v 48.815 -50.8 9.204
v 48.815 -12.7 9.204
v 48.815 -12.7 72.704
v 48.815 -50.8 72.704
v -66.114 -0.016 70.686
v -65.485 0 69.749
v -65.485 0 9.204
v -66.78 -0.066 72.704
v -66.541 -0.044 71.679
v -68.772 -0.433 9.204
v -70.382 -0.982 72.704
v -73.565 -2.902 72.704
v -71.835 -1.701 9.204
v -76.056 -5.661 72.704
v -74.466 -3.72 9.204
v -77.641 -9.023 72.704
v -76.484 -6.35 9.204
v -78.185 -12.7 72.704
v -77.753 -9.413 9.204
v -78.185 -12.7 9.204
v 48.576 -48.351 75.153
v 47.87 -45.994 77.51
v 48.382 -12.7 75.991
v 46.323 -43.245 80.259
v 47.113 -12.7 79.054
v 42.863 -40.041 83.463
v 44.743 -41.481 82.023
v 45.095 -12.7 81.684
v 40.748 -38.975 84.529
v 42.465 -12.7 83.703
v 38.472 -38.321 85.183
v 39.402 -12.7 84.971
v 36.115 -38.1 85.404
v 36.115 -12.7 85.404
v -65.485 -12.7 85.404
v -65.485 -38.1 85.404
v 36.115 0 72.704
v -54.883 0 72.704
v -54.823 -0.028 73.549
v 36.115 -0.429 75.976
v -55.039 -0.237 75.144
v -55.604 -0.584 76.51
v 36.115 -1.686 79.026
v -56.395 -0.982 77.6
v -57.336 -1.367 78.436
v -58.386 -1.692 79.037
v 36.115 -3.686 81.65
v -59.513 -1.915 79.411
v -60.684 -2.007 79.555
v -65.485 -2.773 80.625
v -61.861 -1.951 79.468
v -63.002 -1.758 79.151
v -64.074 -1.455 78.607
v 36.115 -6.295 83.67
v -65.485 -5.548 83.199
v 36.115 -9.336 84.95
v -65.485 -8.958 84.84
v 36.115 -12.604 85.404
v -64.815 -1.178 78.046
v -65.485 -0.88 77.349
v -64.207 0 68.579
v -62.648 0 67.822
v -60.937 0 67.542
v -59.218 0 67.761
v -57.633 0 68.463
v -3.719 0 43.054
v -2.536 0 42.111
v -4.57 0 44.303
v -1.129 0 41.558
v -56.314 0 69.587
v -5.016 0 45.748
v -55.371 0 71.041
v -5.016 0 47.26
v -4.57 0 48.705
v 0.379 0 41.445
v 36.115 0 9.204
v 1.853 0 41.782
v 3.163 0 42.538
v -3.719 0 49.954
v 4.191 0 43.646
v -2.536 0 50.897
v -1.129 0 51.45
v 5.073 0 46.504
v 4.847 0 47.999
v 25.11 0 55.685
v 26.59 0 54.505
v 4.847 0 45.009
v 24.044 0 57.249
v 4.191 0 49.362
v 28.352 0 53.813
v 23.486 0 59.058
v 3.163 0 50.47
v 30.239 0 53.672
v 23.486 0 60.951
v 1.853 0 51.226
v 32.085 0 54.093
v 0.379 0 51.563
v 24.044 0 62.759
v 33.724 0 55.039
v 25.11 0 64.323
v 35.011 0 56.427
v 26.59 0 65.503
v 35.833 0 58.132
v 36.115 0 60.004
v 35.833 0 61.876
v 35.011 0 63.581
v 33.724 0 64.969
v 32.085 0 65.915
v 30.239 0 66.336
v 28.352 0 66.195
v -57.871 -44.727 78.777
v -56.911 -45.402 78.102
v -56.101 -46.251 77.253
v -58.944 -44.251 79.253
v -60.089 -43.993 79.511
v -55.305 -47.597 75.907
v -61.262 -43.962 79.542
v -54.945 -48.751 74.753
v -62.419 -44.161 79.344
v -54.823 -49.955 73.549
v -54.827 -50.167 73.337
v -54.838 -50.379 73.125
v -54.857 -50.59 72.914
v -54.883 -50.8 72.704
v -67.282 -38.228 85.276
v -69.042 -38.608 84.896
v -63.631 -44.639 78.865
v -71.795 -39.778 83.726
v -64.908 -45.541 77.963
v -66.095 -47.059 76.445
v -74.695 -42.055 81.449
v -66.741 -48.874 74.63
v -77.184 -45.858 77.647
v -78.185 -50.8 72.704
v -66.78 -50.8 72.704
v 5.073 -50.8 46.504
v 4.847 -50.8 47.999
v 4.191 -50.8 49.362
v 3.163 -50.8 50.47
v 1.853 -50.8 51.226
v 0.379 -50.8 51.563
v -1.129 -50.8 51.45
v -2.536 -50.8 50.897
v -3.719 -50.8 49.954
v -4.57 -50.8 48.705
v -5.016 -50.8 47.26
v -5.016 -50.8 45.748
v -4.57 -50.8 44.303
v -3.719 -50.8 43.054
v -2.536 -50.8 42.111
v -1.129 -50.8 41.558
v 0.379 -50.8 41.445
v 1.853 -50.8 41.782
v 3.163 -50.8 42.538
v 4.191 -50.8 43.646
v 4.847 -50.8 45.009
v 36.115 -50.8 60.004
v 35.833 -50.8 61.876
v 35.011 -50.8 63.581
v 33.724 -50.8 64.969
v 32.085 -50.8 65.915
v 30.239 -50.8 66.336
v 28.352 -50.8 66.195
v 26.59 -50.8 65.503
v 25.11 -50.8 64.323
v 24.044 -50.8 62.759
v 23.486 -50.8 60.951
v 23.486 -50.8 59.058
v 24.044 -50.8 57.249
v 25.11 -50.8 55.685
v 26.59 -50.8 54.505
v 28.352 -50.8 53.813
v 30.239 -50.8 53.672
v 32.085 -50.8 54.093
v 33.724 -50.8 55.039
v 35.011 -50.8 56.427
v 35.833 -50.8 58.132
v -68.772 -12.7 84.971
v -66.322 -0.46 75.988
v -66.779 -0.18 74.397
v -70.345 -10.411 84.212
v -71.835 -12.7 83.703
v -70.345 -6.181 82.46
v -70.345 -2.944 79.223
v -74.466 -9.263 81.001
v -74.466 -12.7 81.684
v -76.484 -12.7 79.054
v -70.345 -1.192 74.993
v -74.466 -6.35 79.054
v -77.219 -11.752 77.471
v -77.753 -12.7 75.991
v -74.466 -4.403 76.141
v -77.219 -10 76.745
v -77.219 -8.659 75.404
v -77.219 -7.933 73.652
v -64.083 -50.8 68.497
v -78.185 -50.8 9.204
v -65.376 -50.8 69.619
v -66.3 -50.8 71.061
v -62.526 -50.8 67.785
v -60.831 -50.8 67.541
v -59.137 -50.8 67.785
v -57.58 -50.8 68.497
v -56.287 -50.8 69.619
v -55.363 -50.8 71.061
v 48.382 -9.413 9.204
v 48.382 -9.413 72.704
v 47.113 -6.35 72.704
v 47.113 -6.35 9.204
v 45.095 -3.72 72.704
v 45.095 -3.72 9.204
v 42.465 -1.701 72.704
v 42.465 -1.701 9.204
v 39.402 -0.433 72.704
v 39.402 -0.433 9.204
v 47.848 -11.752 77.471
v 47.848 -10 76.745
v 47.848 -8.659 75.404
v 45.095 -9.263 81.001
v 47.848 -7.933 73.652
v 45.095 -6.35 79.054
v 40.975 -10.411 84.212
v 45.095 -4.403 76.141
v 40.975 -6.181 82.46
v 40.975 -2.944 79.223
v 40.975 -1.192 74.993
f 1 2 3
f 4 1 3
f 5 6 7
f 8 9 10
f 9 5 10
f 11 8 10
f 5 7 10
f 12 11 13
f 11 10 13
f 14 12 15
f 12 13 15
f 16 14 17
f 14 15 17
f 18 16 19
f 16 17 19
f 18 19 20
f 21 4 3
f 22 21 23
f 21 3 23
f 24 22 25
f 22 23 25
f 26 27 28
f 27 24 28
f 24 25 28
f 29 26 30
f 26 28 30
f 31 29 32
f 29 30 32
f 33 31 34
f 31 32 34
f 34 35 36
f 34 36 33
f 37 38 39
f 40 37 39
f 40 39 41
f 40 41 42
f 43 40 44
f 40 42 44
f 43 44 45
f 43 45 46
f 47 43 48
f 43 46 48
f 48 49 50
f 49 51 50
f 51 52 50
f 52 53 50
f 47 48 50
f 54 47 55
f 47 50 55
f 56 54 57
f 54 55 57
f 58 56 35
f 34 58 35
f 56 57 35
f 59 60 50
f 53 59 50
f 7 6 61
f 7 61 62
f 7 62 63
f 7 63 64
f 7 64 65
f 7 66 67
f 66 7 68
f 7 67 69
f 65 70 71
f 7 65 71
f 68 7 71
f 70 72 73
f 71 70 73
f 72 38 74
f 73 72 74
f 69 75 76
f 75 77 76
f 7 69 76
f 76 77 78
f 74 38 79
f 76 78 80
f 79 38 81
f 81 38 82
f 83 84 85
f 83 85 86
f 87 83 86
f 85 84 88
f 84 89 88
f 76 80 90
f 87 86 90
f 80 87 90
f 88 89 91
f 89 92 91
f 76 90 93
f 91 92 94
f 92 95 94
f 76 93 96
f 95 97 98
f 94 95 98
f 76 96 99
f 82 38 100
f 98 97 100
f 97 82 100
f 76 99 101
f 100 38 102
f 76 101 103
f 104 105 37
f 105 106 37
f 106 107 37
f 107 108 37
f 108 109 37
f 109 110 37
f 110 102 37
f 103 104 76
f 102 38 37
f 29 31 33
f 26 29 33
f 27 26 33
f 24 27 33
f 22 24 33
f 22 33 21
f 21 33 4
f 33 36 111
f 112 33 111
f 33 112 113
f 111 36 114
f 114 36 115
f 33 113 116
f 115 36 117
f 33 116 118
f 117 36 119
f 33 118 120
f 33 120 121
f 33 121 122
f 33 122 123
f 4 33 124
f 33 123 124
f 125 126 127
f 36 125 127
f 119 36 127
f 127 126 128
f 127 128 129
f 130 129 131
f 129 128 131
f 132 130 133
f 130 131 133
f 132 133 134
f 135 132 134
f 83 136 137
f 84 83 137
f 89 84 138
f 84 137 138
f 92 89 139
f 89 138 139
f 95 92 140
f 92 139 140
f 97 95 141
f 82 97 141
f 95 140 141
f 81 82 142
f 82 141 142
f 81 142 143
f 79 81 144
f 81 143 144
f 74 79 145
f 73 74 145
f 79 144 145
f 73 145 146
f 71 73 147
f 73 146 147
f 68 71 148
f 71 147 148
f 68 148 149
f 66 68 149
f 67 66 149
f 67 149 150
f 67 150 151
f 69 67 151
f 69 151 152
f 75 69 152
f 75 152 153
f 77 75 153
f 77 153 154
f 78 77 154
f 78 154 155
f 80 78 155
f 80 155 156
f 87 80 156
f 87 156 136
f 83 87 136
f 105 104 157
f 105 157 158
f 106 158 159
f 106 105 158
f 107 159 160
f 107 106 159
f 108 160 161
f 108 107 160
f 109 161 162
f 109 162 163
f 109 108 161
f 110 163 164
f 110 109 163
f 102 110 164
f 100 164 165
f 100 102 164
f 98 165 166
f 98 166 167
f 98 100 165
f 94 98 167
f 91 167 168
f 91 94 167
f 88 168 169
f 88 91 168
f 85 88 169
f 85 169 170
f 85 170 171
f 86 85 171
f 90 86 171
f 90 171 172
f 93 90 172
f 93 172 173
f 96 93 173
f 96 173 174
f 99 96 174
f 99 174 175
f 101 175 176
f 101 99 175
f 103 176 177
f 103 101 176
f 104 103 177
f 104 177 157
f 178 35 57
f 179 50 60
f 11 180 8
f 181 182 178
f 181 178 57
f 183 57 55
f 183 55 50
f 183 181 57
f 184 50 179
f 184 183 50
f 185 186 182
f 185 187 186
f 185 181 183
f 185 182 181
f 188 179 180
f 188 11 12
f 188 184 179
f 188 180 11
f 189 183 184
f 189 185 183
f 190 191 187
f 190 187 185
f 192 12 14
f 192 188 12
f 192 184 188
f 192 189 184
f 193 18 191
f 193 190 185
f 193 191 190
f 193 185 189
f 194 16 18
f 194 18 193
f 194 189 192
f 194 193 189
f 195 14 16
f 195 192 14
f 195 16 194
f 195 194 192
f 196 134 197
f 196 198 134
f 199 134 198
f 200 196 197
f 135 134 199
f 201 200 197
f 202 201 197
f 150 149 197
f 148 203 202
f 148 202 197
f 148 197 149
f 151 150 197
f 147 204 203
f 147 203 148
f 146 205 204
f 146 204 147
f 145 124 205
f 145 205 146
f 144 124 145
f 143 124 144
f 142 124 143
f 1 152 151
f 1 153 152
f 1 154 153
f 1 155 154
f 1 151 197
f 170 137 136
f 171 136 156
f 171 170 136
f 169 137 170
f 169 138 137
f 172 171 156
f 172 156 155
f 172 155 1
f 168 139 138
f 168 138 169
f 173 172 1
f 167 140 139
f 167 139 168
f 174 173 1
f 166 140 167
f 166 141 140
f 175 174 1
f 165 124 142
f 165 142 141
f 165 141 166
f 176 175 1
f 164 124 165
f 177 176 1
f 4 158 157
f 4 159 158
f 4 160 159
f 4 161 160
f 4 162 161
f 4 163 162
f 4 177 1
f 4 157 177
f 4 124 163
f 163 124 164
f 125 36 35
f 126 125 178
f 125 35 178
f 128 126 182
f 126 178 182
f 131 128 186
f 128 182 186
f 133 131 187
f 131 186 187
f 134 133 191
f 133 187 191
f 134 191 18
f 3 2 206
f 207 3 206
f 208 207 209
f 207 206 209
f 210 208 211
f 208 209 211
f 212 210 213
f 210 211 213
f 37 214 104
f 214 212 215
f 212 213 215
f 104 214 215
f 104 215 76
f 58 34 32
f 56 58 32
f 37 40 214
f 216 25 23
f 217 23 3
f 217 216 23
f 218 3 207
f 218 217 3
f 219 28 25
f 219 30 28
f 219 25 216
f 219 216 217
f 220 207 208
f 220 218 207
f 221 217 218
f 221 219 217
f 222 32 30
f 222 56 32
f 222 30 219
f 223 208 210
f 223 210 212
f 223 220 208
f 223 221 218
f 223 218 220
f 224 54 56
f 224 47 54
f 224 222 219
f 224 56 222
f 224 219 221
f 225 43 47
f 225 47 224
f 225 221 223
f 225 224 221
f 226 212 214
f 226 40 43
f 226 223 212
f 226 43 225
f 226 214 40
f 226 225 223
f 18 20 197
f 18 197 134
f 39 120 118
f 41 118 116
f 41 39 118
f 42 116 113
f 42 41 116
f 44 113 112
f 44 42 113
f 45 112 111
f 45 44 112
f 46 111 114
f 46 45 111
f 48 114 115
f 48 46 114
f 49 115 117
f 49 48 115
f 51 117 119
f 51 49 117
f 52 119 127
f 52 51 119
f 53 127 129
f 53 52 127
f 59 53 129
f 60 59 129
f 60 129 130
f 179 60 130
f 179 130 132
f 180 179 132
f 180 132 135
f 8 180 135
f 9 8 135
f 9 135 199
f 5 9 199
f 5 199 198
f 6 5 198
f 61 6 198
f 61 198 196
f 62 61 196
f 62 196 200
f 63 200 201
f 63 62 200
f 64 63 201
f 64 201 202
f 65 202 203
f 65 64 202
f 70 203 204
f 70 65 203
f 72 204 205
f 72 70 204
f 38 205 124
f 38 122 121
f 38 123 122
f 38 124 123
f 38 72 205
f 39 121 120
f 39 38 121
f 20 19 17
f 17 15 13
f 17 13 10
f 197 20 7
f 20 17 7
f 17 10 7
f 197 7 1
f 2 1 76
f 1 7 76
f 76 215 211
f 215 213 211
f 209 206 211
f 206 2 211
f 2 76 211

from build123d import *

# Parameters (mm, degrees)
F0_W        = 127
F0_H        = 76.2
F0_R        = 6.0082051914
F0_R_2      = 6.35
F1_DEPTH    = 50.8
F2_R        = 5.0727698676
F3_DEPTH    = 72.136
F4_T1_DEPTH = 192.3207478943
F5_T1_DEPTH = 190.5
F6_T1_DEPTH = 57.15
F6_T3_DEPTH = 95.25
F6_T6_ANGLE = 90.000000001
F6_T8_ANGLE = 90.000000001


# Not quite as in the source:
# - a fillet or chamfer that OpenCascade refuses, or shapes differently, is made with other operations: its cross-section is extruded or revolved along the edge and cut away or added


with BuildPart() as f1:
    # F0 (on Front) → F1 (new body)
    with BuildSketch(Plane.XZ):
        with Locations((-14.6853402257, 47.3040914883)):
            Rectangle(F0_W, F0_H)
        with Locations((-60.8313269913, 73.5488906503)):
            Circle(F0_R, mode=Mode.SUBTRACT)
        with Locations((29.7646597743, 60.0040914883)):
            Circle(F0_R_2, mode=Mode.SUBTRACT)
    extrude(amount=F1_DEPTH)

    # F2 (on face) → F3 (cut)
    with BuildSketch(Plane.XZ.offset(50.8)):
        with Locations((0, 46.5039759874)):
            Circle(F2_R)
    extrude(amount=-F3_DEPTH, mode=Mode.SUBTRACT)

    # F4: chamfer of 12.7 on 1 edges, made by hand

    # F4_s2 → F4_t1 (cut)
    with BuildSketch(Plane.YZ.offset(-110.8457141729)):
        Polygon((-38.1, 85.4040914883), (-50.8, 72.7040914883), (-50.8, 85.4040914883), align=None)
    extrude(amount=F4_T1_DEPTH, mode=Mode.SUBTRACT)

    # F5: fillet of radius 12.7 on 1 edges, made by hand

    # F5_s2 → F5_t1 (cut)
    with BuildSketch(Plane.YZ.offset(-109.9353402257)):
        with BuildLine():
            ThreePointArc((0, 72.7040914883), (-3.7197438789, 81.6843476094), (-12.7, 85.4040914883))
            Line((-12.7, 85.4040914883), (0, 85.4040914883))
            Line((0, 85.4040914883), (0, 72.7040914883))
        make_face()
    extrude(amount=F5_T1_DEPTH, mode=Mode.SUBTRACT)

    # F6: fillet of radius 12.7 on 2 edges, made by hand

    # F6_s2 → F6_t1 (cut)
    with BuildSketch(Plane.XZ.offset(12.7)):
        with BuildLine():
            ThreePointArc((-65.4853402257, 85.4040914883), (-74.4655963468, 81.6843476094), (-78.1853402257, 72.7040914883))
            Line((-78.1853402257, 72.7040914883), (-78.1853402257, 85.4040914883))
            Line((-78.1853402257, 85.4040914883), (-65.4853402257, 85.4040914883))
        make_face()
        with BuildLine():
            ThreePointArc((48.8146597743, 72.7040914883), (45.0949158954, 81.6843476094), (36.1146597743, 85.4040914883))
            Line((36.1146597743, 85.4040914883), (48.8146597743, 85.4040914883))
            Line((48.8146597743, 85.4040914883), (48.8146597743, 72.7040914883))
        make_face()
    extrude(amount=F6_T1_DEPTH, mode=Mode.SUBTRACT)

    # F6_s4 → F6_t3 (cut)
    with BuildSketch(Plane.XY.offset(-22.5459085117)):
        with BuildLine():
            ThreePointArc((48.8146597743, -12.7), (45.0949158954, -3.7197438789), (36.1146597743, 0))
            Line((36.1146597743, 0), (48.8146597743, 0))
            Line((48.8146597743, 0), (48.8146597743, -12.7))
        make_face()
        with BuildLine():
            ThreePointArc((-65.4853402257, 0), (-74.4655963468, -3.7197438789), (-78.1853402257, -12.7))
            Line((-78.1853402257, -12.7), (-78.1853402257, 0))
            Line((-78.1853402257, 0), (-65.4853402257, 0))
        make_face()
    extrude(amount=F6_T3_DEPTH, mode=Mode.SUBTRACT)

    # F6_s5 → F6_t6 (revolve, cut)
    with BuildSketch(Plane.XZ.offset(12.6999999999)):
        with BuildLine():
            ThreePointArc((48.8146597743, 72.7040914883), (45.0949158954, 81.6843476094), (36.1146597743, 85.4040914883))
            Line((36.1146597743, 85.4040914883), (48.8146597743, 85.4040914883))
            Line((48.8146597743, 85.4040914883), (48.8146597743, 72.7040914883))
        make_face()
    revolve(axis=Axis((48.8146597743, -12.6999999999, 72.7040914884), (-1, 0, 0)), revolution_arc=F6_T6_ANGLE, mode=Mode.SUBTRACT)

    # F6_s7 → F6_t8 (revolve, cut)
    with BuildSketch(Plane.XZ.offset(12.6999999999)):
        with BuildLine():
            ThreePointArc((-65.4853402257, 85.4040914883), (-74.4655963468, 81.6843476094), (-78.1853402257, 72.7040914883))
            Line((-78.1853402257, 72.7040914883), (-78.1853402257, 85.4040914883))
            Line((-78.1853402257, 85.4040914883), (-65.4853402257, 85.4040914883))
        make_face()
    revolve(axis=Axis((-78.1853402257, -12.6999999999, 72.7040914884), (-1, 0, 0)), revolution_arc=F6_T8_ANGLE, mode=Mode.SUBTRACT)


solid = f1.part
